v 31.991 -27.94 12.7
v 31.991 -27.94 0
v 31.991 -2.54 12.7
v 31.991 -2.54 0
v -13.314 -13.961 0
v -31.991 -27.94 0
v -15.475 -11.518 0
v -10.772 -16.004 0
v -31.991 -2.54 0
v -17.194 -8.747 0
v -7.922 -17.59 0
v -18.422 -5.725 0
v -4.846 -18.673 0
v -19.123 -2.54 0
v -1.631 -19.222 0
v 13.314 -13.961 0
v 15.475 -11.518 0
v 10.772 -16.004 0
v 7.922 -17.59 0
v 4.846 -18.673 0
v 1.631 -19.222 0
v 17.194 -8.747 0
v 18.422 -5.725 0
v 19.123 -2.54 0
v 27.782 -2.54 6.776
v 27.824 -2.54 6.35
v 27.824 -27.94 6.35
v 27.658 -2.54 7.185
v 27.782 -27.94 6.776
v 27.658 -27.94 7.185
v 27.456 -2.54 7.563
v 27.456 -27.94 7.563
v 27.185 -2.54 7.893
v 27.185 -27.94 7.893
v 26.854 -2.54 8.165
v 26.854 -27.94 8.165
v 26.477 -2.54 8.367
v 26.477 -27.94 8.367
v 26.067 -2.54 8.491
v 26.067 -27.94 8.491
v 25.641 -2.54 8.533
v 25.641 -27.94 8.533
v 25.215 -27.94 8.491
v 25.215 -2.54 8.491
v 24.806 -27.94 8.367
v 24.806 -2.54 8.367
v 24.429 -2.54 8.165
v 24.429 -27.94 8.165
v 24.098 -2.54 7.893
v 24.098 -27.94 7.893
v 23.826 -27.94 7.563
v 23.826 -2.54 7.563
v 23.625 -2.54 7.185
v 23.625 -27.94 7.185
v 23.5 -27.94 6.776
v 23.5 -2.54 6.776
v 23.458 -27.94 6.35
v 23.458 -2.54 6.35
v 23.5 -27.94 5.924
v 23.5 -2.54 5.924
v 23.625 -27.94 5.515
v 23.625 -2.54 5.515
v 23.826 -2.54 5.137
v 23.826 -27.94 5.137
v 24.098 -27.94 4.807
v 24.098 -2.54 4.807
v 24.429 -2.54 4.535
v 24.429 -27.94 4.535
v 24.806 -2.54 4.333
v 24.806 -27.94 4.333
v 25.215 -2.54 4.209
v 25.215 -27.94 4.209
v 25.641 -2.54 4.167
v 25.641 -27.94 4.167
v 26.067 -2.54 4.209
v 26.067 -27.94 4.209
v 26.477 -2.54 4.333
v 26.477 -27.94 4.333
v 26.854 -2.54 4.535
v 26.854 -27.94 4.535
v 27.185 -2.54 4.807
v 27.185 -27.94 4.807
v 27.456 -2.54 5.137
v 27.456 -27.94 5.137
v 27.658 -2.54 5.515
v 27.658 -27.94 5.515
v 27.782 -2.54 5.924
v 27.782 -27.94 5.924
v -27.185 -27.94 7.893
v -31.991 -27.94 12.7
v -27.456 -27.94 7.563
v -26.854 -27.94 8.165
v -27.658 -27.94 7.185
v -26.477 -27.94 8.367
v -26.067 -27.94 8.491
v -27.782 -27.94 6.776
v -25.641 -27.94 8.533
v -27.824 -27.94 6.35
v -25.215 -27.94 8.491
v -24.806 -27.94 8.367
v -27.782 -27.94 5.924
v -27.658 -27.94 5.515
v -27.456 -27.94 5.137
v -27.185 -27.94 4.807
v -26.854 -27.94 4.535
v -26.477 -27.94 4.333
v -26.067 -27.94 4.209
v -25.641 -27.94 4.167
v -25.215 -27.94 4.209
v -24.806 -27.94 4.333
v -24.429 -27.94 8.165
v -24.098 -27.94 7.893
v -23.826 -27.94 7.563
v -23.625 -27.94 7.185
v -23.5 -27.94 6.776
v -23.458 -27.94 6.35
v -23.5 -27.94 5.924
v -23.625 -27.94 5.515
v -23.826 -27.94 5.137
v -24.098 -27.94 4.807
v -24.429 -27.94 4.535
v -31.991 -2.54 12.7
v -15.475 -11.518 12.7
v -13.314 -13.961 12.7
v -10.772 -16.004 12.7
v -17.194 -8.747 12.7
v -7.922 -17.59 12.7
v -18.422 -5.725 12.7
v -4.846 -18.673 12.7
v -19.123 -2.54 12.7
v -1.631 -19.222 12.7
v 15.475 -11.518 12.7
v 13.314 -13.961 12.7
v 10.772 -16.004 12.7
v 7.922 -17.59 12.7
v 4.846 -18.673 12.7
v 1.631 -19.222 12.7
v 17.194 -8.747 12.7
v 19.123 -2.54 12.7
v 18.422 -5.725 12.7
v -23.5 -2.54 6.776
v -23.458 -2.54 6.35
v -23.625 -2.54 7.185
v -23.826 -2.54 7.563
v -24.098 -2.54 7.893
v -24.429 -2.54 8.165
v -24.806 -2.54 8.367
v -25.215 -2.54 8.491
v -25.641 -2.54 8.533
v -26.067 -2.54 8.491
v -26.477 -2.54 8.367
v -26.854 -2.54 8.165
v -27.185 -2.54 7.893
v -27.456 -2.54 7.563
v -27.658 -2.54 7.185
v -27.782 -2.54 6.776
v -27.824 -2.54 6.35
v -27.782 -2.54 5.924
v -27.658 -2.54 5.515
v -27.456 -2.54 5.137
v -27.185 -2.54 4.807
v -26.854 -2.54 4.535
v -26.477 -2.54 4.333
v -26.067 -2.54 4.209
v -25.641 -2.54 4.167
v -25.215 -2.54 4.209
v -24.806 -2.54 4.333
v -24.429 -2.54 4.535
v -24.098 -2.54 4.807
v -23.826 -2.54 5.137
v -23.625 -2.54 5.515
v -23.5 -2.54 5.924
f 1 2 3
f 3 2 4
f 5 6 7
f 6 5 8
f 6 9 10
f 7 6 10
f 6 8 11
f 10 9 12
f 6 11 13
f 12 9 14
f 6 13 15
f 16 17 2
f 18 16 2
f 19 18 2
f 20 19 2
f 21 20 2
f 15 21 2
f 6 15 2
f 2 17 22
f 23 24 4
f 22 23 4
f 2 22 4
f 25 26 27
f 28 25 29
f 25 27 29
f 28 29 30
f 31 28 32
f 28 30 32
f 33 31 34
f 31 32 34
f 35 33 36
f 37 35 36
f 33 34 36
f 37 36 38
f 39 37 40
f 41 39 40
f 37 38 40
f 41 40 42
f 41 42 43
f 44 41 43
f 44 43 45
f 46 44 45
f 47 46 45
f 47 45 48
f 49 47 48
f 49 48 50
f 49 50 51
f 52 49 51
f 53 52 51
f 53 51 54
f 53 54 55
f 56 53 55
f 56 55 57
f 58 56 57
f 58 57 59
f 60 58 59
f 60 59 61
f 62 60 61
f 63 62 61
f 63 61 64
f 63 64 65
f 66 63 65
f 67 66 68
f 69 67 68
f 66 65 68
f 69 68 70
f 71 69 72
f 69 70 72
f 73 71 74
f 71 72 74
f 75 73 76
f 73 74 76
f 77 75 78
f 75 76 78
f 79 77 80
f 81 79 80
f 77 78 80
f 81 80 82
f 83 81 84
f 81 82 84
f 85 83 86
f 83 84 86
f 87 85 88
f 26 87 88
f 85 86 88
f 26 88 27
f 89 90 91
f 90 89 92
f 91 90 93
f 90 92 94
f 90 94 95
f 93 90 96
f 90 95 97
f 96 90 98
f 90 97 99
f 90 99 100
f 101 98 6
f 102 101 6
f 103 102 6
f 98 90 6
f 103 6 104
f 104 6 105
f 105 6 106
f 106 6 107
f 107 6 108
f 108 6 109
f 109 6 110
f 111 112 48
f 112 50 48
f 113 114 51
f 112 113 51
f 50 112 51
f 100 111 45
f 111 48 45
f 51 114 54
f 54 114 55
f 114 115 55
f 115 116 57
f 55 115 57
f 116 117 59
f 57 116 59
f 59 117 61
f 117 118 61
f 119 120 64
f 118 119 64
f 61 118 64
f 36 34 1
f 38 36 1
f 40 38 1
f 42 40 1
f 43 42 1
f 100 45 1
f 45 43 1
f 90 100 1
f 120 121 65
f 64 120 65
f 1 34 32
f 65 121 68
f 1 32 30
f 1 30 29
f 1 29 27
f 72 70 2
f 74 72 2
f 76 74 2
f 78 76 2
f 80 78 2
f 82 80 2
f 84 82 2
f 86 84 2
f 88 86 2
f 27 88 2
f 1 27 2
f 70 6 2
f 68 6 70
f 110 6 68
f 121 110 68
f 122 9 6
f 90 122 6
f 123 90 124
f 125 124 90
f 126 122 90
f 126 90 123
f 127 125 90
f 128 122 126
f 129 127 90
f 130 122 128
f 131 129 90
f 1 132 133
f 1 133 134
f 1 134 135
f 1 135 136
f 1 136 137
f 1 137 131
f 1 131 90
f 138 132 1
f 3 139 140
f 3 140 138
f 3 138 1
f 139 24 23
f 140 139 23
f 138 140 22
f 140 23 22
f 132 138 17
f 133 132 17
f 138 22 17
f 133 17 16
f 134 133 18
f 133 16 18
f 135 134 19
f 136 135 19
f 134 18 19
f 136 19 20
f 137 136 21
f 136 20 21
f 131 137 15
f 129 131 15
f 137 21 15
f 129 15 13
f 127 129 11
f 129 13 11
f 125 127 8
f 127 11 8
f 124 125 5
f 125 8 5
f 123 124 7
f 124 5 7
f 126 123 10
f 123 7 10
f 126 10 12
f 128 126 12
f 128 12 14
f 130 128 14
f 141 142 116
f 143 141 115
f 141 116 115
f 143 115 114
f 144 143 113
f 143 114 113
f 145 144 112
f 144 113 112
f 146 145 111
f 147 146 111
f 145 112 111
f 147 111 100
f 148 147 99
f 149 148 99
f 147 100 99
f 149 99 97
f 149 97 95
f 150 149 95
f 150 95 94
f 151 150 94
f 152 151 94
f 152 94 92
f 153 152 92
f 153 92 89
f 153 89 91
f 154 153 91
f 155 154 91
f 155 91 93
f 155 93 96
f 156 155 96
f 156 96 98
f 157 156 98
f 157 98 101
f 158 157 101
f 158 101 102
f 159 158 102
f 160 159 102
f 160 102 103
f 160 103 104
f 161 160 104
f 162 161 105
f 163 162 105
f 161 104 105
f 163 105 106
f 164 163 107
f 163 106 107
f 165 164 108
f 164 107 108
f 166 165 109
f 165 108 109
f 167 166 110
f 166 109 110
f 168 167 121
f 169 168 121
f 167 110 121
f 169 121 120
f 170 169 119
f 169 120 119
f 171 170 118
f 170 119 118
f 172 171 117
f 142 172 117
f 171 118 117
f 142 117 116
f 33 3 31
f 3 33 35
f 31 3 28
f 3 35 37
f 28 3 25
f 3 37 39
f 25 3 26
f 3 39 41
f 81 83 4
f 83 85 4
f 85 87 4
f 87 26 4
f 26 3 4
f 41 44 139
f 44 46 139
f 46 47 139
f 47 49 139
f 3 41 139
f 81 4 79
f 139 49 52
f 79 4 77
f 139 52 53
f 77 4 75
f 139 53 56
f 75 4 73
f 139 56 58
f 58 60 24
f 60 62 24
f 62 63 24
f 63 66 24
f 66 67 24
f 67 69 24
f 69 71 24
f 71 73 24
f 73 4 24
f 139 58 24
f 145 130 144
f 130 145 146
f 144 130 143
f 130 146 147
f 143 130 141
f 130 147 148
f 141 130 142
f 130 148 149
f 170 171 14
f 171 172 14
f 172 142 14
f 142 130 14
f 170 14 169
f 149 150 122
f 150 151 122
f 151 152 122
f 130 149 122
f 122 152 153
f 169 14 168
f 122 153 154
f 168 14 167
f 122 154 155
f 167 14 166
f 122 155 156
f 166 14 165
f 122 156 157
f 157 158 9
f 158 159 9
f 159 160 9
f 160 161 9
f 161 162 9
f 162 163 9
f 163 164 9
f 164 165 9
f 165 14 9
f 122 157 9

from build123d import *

# Parameters (mm, degrees)
BOSS_EXTRUDE1_DEPTH = 12.7
SKETCH2_R           = 2.1828125
CUT_EXTRUDE1_DEPTH  = 43.777251848


with BuildPart() as part:
    # Sketch1 → Boss-Extrude1 (new body)
    with BuildSketch(Plane.XY):
        with BuildLine():
            Line((-19.123353673, -2.54), (-31.9913, -2.54))
            Line((-31.9913, -2.54), (-31.9913, -27.94))
            Line((-31.9913, -27.94), (31.9913, -27.94))
            Line((31.9913, -27.94), (31.9913, -2.54))
            Line((31.9913, -2.54), (19.123353673, -2.54))
            ThreePointArc((19.123353673, -2.54), (0, -19.2913), (-19.123353673, -2.54))
        make_face()
    extrude(amount=BOSS_EXTRUDE1_DEPTH)

    # Sketch2 → Cut-Extrude1 (cut, through all)
    with BuildSketch(Plane.XZ.offset(27.94)):
        with Locations((-25.6413, 6.35)):
            Circle(SKETCH2_R)
        with Locations((25.6413, 6.35)):
            Circle(SKETCH2_R)
    extrude(amount=-CUT_EXTRUDE1_DEPTH, mode=Mode.SUBTRACT)


solid = part.part
